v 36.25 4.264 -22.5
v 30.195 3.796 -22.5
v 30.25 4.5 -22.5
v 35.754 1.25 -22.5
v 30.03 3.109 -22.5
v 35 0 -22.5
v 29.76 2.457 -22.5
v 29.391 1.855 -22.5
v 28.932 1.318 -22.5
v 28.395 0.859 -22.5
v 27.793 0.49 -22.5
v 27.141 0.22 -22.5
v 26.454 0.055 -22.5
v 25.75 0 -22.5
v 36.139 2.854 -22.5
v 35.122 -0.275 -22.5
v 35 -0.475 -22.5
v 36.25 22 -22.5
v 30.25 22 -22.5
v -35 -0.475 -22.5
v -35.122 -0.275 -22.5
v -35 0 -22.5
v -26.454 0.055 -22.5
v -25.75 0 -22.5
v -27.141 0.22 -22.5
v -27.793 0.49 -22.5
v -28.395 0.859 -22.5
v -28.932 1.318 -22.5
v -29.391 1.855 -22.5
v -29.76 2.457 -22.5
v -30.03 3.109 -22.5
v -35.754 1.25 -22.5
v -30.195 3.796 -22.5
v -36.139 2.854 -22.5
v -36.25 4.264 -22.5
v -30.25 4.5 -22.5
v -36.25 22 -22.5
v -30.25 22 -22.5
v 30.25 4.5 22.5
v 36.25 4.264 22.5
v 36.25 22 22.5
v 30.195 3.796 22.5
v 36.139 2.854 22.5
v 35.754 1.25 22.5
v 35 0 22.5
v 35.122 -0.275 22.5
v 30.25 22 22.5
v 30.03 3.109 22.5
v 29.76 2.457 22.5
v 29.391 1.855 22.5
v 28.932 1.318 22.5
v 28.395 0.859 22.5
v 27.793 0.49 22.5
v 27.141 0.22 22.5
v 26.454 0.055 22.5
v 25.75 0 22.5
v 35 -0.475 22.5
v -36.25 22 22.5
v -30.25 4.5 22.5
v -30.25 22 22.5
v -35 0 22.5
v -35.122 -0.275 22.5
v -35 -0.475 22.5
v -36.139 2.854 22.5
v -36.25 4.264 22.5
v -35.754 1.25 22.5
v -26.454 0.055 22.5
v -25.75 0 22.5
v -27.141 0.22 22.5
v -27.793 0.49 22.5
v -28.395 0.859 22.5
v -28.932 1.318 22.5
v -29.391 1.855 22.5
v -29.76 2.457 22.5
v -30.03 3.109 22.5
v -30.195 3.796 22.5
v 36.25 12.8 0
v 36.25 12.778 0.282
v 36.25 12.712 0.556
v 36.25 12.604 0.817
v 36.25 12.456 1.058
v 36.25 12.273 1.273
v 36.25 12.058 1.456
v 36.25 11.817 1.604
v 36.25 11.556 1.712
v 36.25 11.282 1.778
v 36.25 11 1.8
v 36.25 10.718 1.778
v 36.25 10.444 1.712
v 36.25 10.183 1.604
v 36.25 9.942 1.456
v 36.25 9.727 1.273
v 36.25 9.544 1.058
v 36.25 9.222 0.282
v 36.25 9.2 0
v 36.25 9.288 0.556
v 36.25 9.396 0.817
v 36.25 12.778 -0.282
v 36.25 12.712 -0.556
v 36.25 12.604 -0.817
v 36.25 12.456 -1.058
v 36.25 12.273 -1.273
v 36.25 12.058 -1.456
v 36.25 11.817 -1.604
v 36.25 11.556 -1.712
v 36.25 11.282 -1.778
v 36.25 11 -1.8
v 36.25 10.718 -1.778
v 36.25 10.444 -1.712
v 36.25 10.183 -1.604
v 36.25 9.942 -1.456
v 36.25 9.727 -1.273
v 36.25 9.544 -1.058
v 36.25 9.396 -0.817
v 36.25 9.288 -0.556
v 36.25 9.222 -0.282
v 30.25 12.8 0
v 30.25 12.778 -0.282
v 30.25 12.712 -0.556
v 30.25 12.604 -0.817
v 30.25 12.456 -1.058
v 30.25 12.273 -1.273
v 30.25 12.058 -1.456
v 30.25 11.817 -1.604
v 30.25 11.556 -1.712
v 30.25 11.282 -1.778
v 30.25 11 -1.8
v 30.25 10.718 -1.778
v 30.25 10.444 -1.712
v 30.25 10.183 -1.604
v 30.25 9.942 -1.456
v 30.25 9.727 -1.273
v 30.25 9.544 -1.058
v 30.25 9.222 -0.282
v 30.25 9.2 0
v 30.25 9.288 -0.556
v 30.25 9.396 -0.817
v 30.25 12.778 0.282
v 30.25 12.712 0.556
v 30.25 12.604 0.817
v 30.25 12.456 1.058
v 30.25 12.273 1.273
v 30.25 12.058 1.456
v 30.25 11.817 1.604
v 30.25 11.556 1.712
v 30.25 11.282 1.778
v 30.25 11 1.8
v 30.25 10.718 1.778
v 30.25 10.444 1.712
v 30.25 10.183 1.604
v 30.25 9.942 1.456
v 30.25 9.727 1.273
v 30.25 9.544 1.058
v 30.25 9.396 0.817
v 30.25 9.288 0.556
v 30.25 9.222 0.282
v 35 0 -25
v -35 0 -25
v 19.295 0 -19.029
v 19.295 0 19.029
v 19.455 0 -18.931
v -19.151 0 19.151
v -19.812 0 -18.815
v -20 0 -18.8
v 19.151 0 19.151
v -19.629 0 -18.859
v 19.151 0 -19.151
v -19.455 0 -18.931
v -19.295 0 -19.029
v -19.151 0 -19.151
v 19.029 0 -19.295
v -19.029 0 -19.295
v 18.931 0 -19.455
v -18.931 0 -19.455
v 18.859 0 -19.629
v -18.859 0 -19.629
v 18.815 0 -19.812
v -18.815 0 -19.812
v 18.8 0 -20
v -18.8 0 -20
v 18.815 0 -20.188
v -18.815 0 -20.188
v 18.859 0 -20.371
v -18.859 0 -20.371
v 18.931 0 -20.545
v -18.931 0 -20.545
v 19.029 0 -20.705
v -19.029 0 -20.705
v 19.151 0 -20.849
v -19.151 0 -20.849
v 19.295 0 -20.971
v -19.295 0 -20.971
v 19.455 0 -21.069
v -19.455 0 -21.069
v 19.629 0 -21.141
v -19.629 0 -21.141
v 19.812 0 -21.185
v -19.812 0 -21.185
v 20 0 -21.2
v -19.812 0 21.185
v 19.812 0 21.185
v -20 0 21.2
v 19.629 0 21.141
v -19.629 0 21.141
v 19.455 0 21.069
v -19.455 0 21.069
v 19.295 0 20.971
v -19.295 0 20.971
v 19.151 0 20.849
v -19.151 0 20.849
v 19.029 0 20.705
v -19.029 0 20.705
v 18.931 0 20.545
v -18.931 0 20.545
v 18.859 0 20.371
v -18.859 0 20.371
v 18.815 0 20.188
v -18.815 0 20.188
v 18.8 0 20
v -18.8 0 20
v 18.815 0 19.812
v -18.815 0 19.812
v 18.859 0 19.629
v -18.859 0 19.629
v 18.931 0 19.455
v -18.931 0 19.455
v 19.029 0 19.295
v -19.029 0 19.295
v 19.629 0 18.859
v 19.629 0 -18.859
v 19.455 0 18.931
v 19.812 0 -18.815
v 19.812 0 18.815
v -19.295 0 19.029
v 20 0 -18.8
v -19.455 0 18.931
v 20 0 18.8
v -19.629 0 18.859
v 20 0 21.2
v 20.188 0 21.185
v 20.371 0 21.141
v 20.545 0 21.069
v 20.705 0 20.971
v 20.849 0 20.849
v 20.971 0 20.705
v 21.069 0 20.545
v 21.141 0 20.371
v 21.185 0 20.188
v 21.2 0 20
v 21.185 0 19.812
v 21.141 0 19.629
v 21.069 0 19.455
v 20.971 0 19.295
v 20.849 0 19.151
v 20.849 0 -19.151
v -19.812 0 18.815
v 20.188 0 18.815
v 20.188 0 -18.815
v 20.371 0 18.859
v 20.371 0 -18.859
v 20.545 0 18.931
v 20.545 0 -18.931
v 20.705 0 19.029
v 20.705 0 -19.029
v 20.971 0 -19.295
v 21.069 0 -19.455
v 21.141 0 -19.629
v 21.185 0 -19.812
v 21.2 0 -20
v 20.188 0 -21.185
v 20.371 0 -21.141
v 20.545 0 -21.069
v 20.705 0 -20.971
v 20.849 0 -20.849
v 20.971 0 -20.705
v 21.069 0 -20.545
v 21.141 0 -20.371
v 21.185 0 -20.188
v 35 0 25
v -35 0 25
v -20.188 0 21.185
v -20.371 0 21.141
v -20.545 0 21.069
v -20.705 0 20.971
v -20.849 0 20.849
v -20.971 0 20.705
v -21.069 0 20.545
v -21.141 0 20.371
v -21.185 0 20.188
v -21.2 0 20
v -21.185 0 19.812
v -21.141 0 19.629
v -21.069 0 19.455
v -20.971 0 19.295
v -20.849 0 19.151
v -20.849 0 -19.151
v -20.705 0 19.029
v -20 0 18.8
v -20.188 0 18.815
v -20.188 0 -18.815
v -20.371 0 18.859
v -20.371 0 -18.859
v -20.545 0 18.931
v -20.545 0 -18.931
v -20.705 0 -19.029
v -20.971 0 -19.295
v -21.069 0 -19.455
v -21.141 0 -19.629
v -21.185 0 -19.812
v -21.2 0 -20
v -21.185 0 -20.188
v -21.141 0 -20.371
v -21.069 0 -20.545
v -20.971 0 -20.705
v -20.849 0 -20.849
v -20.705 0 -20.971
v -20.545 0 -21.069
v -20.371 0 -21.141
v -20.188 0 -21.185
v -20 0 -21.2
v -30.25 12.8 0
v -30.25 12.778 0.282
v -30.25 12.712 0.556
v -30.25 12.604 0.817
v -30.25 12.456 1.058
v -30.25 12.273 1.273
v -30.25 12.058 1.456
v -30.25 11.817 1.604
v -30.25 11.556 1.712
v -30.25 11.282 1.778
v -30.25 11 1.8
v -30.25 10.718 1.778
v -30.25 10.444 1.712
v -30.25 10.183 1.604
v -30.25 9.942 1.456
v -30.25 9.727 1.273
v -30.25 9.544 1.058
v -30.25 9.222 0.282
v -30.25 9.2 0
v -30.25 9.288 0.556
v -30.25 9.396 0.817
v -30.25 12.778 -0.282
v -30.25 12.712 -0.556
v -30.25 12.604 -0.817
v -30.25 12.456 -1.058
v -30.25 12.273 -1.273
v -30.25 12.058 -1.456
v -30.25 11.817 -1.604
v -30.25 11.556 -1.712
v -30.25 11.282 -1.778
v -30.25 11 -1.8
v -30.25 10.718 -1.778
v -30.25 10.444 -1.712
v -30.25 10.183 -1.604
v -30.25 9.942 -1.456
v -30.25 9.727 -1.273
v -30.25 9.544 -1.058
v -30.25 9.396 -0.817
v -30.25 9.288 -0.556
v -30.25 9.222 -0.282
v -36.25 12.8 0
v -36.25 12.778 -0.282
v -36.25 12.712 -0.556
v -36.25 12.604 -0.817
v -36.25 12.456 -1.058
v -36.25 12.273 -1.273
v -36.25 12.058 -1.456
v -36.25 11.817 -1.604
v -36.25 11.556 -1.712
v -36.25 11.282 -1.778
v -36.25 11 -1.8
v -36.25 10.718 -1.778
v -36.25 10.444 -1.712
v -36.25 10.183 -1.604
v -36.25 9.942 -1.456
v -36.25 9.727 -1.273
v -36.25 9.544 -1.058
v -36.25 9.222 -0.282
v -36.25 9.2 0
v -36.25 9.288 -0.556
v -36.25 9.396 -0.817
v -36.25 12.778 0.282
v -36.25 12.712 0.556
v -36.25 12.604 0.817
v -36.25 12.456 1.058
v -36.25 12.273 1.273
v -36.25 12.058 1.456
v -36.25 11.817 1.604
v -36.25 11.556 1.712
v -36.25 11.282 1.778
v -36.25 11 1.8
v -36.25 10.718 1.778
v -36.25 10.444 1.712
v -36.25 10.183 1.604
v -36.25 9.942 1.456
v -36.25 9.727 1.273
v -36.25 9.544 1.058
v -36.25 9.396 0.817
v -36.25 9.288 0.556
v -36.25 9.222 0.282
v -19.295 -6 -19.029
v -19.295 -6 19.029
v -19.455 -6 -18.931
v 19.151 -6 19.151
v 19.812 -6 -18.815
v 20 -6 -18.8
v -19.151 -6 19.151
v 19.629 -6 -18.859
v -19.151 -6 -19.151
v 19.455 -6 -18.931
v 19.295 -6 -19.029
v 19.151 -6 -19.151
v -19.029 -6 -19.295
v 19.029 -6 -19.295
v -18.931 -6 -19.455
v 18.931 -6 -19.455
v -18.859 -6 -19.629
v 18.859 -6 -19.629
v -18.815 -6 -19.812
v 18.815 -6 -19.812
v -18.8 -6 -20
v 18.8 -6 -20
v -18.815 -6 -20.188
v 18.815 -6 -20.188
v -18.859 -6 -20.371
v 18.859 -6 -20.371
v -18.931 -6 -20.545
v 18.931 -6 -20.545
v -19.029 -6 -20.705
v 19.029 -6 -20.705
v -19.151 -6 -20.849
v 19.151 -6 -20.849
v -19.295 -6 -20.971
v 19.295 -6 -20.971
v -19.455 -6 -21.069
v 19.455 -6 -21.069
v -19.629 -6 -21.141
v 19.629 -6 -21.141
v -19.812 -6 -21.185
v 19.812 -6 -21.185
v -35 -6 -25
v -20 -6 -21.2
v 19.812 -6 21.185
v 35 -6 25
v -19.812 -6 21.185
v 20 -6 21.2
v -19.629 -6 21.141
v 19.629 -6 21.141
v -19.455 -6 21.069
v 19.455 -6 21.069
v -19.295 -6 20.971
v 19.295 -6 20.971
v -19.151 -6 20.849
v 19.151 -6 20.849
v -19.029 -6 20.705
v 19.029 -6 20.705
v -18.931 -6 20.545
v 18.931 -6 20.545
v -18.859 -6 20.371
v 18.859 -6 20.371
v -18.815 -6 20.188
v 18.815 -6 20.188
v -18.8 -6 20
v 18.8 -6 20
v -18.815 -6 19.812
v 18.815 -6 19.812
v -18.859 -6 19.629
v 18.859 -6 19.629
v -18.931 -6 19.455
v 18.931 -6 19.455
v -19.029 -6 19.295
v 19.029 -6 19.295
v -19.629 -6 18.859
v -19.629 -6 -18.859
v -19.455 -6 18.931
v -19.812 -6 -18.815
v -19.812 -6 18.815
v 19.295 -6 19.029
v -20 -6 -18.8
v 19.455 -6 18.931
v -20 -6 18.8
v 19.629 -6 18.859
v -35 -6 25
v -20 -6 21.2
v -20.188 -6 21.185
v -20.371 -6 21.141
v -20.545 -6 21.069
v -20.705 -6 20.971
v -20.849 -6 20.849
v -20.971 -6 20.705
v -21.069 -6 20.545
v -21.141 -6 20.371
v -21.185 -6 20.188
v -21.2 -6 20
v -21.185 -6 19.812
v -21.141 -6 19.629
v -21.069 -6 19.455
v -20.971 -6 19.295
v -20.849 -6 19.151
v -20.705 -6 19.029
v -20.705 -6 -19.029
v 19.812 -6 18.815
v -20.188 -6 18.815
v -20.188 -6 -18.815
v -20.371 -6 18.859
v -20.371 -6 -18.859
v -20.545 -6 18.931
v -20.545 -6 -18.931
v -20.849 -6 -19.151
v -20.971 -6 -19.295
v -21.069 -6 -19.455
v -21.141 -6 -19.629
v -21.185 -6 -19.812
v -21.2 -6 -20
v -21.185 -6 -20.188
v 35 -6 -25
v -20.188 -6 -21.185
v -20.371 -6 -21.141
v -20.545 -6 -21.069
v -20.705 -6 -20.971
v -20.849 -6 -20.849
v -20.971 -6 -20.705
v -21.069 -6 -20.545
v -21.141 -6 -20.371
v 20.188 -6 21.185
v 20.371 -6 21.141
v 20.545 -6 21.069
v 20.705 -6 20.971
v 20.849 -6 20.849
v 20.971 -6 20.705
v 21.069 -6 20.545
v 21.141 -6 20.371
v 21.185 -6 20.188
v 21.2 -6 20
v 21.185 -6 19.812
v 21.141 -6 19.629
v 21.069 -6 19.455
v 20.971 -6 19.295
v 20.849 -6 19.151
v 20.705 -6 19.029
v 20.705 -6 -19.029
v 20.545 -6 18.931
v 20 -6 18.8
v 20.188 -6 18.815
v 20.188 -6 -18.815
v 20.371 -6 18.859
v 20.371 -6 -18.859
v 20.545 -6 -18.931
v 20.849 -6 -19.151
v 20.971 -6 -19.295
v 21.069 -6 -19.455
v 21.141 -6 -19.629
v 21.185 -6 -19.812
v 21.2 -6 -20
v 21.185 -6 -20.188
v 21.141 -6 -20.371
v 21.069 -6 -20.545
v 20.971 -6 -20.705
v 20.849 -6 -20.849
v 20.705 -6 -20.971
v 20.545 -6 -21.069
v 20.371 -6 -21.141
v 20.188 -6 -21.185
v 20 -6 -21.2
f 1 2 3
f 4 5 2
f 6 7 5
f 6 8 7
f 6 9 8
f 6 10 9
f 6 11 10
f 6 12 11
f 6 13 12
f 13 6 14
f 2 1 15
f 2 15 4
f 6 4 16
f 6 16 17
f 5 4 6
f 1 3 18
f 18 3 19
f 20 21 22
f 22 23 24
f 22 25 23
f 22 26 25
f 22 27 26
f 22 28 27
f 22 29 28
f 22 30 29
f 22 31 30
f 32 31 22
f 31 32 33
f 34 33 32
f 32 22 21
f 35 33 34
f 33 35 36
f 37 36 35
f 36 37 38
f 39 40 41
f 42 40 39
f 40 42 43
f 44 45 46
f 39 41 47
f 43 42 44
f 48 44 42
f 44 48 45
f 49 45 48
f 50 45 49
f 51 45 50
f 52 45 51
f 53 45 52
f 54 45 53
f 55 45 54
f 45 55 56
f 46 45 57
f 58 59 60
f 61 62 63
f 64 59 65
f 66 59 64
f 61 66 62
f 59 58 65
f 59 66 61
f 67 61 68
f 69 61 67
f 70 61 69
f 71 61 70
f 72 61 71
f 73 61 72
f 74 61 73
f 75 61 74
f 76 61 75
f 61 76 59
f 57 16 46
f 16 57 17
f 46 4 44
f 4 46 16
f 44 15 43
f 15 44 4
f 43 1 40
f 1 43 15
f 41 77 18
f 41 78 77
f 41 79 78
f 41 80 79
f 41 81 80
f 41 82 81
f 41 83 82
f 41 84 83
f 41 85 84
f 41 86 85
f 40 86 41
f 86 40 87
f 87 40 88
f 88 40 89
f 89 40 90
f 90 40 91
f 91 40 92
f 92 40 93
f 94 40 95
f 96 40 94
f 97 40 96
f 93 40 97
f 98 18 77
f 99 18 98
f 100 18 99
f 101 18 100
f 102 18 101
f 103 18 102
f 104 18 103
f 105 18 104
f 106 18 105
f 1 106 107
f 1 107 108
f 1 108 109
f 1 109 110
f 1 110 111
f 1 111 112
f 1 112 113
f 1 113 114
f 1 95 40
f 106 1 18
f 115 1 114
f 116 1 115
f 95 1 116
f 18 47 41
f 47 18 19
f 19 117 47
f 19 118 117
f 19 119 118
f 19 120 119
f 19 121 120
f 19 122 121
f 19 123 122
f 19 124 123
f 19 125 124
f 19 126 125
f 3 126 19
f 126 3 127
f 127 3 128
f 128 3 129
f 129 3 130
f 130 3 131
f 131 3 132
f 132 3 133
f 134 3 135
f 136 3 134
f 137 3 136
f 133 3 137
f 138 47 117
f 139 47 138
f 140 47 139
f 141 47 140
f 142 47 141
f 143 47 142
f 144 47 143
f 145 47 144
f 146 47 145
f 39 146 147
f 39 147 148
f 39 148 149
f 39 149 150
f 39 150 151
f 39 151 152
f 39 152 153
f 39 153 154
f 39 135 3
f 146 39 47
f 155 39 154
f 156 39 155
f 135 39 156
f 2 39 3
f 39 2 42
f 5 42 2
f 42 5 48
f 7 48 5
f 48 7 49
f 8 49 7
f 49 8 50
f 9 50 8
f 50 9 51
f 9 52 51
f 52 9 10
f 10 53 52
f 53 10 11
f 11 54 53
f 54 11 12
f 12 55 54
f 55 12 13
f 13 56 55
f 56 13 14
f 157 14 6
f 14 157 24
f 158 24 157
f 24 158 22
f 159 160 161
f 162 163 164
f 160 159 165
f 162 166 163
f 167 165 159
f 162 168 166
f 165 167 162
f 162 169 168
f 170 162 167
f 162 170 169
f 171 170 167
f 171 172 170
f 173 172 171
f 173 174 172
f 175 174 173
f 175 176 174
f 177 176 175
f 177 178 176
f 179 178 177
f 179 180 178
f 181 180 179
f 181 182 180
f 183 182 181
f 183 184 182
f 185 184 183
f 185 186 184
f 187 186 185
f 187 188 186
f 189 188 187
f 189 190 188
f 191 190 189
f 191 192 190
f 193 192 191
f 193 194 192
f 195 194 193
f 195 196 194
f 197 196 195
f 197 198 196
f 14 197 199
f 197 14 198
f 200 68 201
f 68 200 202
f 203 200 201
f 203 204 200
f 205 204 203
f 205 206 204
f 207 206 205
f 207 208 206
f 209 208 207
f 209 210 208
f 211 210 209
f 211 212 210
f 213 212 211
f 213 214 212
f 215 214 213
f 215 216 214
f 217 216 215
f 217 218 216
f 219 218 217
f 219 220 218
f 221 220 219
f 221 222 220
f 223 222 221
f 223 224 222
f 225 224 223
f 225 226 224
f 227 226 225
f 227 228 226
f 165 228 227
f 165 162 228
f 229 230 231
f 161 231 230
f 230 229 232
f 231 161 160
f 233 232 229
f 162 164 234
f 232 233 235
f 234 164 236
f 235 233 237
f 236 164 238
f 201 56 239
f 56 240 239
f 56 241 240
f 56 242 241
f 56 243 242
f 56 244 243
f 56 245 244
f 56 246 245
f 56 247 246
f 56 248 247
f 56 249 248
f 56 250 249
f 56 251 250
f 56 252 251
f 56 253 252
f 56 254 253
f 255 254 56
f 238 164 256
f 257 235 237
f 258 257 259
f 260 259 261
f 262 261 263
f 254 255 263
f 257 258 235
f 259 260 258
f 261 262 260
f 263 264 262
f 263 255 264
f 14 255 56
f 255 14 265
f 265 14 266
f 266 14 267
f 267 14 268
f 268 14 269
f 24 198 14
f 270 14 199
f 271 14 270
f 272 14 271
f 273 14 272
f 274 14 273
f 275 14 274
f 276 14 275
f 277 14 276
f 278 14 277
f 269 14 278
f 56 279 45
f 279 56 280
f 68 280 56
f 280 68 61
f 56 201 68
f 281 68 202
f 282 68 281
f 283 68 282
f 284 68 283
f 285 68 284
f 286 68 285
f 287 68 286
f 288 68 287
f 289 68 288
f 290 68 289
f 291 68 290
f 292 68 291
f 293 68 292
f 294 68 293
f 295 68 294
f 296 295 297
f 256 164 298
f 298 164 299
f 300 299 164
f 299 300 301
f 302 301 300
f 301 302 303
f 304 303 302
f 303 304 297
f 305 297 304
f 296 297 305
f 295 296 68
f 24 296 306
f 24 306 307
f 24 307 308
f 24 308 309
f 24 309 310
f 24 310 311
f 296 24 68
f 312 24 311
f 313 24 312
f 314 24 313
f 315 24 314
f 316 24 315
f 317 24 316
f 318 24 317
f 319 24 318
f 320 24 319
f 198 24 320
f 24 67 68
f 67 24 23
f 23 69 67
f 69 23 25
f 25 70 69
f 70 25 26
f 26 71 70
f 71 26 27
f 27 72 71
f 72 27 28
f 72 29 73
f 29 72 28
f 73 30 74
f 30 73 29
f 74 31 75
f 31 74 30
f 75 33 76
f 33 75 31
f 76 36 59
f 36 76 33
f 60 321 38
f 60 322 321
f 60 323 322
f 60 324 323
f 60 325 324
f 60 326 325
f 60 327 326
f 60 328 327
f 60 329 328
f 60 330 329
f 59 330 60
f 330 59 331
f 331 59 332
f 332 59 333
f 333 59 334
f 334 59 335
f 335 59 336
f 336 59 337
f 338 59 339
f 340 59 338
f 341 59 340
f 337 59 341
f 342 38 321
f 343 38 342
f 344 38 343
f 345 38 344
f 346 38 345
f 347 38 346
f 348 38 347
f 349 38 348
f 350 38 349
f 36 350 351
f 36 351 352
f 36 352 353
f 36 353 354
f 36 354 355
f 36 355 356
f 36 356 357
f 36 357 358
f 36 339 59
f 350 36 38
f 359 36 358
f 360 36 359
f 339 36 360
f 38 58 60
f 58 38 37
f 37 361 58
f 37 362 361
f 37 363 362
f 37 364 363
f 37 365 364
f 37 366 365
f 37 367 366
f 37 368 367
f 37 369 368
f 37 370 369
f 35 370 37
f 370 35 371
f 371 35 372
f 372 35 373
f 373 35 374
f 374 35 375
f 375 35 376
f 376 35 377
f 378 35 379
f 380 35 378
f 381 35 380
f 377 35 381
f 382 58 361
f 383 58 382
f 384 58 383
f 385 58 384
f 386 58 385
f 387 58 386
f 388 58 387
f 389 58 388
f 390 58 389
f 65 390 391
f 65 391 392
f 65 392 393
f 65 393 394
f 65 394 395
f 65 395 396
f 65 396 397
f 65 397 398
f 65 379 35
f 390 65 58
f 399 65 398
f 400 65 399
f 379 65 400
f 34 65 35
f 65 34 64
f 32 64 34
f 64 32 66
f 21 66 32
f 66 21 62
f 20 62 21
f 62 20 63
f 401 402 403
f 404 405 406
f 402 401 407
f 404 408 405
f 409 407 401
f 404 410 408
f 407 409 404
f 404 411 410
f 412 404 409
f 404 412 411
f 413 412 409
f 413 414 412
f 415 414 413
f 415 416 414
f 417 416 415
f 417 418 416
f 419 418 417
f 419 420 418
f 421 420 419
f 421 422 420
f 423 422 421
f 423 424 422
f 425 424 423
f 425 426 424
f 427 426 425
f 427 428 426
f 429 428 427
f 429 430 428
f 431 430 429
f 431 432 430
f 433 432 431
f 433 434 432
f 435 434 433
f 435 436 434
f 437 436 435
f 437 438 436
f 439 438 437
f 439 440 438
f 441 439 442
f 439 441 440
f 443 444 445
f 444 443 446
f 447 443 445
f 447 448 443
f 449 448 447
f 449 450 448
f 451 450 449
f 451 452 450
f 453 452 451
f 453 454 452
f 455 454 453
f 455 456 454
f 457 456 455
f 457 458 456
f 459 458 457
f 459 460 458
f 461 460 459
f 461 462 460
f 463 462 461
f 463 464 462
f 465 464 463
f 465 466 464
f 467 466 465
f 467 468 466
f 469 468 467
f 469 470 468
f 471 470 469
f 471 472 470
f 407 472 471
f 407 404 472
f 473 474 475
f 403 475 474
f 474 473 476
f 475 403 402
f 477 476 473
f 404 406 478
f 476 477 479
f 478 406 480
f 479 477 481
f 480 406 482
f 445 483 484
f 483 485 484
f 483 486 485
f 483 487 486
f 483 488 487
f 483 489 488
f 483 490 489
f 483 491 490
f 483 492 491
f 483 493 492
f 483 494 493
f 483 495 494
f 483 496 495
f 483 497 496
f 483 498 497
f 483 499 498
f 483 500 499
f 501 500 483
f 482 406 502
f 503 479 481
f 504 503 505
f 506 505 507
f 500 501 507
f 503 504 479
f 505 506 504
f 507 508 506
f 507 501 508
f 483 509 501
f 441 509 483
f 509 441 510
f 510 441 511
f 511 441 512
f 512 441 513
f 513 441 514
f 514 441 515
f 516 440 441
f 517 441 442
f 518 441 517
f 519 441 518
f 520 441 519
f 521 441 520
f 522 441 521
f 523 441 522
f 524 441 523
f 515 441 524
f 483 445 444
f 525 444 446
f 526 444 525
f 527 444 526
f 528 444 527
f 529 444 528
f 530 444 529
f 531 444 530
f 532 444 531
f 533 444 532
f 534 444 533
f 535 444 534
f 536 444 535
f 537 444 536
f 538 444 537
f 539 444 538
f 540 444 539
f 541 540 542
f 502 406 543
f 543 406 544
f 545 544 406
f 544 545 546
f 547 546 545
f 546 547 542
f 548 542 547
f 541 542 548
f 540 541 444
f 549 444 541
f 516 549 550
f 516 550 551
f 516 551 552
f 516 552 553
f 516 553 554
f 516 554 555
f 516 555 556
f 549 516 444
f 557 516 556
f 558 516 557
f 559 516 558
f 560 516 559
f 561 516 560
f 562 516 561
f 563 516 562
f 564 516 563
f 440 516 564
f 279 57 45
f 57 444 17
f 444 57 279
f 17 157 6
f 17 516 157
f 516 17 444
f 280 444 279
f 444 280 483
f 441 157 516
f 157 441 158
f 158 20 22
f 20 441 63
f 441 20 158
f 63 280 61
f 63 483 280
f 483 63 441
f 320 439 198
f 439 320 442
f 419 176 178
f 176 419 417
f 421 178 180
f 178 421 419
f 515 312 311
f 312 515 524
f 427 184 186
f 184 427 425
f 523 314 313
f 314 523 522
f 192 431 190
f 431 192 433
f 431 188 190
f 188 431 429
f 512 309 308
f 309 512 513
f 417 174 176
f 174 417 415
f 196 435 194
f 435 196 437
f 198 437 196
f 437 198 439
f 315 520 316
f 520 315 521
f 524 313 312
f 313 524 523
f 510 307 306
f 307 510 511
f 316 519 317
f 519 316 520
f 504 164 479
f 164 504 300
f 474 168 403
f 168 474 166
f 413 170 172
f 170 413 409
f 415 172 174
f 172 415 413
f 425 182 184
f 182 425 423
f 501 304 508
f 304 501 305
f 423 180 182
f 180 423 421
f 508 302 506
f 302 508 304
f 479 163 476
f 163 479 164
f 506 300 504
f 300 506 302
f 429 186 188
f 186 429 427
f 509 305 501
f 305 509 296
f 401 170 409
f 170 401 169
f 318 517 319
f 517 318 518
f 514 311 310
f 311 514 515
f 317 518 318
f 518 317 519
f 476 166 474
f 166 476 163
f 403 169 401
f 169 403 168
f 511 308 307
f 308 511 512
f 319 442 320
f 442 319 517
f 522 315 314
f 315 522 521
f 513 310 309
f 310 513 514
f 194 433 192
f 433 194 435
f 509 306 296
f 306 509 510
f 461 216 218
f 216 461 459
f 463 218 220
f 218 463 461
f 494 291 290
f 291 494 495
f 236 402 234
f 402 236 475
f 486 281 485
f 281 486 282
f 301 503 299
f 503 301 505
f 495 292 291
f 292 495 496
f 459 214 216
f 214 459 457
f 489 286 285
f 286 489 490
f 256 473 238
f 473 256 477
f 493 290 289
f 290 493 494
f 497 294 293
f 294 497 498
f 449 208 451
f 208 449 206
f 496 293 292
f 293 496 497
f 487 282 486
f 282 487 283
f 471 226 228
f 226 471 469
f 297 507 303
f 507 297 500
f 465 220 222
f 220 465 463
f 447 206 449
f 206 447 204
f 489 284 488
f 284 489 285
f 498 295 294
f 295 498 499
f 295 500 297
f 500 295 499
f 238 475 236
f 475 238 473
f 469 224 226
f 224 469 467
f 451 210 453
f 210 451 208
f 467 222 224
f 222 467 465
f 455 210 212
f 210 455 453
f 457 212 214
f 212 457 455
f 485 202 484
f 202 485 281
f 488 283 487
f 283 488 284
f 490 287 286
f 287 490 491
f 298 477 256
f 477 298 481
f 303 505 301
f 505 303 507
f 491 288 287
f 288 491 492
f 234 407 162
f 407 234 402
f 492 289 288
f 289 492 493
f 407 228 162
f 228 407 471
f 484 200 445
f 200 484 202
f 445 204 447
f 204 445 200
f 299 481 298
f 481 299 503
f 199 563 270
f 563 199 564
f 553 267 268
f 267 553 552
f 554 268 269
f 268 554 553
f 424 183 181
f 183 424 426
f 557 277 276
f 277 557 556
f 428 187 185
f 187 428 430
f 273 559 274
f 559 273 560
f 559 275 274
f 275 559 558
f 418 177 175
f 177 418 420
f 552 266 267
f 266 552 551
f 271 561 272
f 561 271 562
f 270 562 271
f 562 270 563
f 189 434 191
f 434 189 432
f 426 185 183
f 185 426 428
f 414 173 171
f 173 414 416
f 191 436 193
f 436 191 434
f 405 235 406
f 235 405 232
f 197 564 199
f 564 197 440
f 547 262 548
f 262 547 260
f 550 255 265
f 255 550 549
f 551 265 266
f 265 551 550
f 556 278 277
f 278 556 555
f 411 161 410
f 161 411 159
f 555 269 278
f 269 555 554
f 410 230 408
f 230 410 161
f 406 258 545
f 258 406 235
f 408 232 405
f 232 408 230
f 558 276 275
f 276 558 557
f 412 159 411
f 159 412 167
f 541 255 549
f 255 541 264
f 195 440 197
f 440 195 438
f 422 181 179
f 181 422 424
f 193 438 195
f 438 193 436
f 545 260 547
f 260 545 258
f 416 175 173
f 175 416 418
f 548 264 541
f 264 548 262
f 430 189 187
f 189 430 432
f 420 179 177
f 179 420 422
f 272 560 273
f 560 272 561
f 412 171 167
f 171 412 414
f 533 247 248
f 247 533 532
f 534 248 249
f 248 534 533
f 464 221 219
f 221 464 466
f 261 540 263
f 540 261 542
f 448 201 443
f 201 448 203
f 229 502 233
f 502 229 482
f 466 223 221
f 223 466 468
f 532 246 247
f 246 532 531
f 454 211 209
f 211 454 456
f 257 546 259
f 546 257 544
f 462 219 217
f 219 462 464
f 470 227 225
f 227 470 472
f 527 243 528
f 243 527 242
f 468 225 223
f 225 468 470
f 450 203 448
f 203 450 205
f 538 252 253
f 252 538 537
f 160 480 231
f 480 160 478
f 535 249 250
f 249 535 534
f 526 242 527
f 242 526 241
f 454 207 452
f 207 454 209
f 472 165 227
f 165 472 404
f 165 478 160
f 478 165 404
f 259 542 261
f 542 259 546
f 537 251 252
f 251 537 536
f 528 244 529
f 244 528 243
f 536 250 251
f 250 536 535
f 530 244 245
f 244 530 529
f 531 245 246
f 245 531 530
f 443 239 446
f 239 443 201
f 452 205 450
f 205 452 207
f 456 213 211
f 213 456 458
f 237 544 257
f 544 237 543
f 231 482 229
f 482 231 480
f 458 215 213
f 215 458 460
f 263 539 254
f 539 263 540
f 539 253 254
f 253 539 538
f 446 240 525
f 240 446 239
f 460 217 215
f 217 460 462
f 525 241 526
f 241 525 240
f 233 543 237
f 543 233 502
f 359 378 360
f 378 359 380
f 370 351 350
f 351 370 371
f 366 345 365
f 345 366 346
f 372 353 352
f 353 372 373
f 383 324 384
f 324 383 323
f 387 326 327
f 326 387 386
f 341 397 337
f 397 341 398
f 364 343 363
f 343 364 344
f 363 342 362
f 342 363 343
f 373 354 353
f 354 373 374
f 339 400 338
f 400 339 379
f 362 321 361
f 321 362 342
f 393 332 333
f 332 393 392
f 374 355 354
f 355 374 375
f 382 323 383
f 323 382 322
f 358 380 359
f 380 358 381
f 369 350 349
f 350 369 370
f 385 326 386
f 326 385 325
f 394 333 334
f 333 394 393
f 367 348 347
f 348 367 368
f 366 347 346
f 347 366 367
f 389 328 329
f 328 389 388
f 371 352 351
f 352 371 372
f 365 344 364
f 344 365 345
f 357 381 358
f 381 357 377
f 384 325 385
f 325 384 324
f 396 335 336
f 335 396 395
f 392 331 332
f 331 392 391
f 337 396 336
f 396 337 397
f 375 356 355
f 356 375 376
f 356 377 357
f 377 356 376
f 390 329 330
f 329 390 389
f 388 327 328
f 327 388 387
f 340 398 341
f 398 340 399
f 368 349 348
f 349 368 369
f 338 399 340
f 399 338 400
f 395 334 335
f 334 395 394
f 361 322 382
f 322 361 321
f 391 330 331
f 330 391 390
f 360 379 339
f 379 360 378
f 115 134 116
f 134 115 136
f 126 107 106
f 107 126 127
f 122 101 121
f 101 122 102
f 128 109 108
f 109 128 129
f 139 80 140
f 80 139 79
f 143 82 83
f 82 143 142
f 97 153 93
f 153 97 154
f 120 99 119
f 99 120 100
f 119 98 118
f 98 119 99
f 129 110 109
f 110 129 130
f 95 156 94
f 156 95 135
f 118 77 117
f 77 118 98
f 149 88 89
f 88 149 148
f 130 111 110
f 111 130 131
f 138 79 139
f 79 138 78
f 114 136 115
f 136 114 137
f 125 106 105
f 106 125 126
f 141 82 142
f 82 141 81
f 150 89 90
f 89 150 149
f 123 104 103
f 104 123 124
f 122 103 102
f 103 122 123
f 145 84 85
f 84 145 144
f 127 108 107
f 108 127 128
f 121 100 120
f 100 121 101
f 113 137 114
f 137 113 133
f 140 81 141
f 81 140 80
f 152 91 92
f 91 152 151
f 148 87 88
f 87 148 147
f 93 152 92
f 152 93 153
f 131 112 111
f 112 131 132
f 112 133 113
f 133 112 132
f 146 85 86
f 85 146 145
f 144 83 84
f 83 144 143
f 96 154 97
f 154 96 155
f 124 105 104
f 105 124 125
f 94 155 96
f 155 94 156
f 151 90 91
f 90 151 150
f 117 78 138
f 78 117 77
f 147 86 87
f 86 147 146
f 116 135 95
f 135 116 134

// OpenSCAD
// N-117M 臂后 C 形顶丝抱箍 + 矩形板（一件）。
// 后+左右近乎直角，后棱小圆角 r=3。顶丝在左右贴合壁。
// 卡尺约 57.5；内腔 = 57.5 + 两侧各 1.5。禁止 use openscad_V1。
// 导出：openscad -D 'part="clamp"' -o ../stl/arm_clamp.stl

part = "preview"; // preview | clamp

$fn = 40;

inner_w = 57.5;
print_clear = 1.5;
clamp_h = 45.0;
wall = 6.0;
wrap_y = 22.0;
r_rear = 3.0;
plate_x = 70.0;
plate_z = 50.0;
plate_t = 6.0;
plate_pitch = 40.0;
m3_tap_d = 2.4;
m4_tap_d = 3.6;

cavity_w = inner_w + 2 * print_clear;
fillet_r = r_rear + print_clear;

/**
 * XY 内腔：后棱小圆角，开口朝 +Y 让燕尾。
 */
module clamp_cavity_2d() {
    r = fillet_r;
    w = cavity_w;
    hull() {
        translate([-w / 2 + r, r])
            circle(r = r);
        translate([w / 2 - r, r])
            circle(r = r);
        translate([-w / 2, wrap_y - 0.05])
            square([0.1, 0.1]);
        translate([w / 2 - 0.1, wrap_y - 0.05])
            square([0.1, 0.1]);
    }
}

/**
 * 内腔外偏 wall。
 */
module clamp_outer_2d() {
    offset(delta = wall)
        clamp_cavity_2d();
}

/**
 * C 形与后侧矩形板一件。左右各一颗 M4 顶丝；板上 4×M3 自攻底孔对盖。
 */
module arm_clamp_solid() {
    difference() {
        union() {
            linear_extrude(height = clamp_h, center = true)
                difference() {
                    clamp_outer_2d();
                    clamp_cavity_2d();
                    translate([0, wrap_y + 40])
                        square([200, 80], center = true);
                }
            translate([0, -plate_t / 2, 0])
                cube([plate_x, plate_t, plate_z], center = true);
        }
        h = plate_pitch / 2;
        for (x = [-h, h], z = [-h, h])
            translate([x, -plate_t / 2, z])
                rotate([90, 0, 0])
                    cylinder(d = m3_tap_d, h = plate_t + 2, center = true);
        for (side = [-1, 1])
            translate([side * (cavity_w / 2 + wall / 2), wrap_y / 2, 0])
                rotate([0, 90, 0])
                    cylinder(d = m4_tap_d, h = wall + 4, center = true);
    }
}

if (part == "clamp")
    arm_clamp_solid();
else
    color([0.18, 0.18, 0.2])
        arm_clamp_solid();
